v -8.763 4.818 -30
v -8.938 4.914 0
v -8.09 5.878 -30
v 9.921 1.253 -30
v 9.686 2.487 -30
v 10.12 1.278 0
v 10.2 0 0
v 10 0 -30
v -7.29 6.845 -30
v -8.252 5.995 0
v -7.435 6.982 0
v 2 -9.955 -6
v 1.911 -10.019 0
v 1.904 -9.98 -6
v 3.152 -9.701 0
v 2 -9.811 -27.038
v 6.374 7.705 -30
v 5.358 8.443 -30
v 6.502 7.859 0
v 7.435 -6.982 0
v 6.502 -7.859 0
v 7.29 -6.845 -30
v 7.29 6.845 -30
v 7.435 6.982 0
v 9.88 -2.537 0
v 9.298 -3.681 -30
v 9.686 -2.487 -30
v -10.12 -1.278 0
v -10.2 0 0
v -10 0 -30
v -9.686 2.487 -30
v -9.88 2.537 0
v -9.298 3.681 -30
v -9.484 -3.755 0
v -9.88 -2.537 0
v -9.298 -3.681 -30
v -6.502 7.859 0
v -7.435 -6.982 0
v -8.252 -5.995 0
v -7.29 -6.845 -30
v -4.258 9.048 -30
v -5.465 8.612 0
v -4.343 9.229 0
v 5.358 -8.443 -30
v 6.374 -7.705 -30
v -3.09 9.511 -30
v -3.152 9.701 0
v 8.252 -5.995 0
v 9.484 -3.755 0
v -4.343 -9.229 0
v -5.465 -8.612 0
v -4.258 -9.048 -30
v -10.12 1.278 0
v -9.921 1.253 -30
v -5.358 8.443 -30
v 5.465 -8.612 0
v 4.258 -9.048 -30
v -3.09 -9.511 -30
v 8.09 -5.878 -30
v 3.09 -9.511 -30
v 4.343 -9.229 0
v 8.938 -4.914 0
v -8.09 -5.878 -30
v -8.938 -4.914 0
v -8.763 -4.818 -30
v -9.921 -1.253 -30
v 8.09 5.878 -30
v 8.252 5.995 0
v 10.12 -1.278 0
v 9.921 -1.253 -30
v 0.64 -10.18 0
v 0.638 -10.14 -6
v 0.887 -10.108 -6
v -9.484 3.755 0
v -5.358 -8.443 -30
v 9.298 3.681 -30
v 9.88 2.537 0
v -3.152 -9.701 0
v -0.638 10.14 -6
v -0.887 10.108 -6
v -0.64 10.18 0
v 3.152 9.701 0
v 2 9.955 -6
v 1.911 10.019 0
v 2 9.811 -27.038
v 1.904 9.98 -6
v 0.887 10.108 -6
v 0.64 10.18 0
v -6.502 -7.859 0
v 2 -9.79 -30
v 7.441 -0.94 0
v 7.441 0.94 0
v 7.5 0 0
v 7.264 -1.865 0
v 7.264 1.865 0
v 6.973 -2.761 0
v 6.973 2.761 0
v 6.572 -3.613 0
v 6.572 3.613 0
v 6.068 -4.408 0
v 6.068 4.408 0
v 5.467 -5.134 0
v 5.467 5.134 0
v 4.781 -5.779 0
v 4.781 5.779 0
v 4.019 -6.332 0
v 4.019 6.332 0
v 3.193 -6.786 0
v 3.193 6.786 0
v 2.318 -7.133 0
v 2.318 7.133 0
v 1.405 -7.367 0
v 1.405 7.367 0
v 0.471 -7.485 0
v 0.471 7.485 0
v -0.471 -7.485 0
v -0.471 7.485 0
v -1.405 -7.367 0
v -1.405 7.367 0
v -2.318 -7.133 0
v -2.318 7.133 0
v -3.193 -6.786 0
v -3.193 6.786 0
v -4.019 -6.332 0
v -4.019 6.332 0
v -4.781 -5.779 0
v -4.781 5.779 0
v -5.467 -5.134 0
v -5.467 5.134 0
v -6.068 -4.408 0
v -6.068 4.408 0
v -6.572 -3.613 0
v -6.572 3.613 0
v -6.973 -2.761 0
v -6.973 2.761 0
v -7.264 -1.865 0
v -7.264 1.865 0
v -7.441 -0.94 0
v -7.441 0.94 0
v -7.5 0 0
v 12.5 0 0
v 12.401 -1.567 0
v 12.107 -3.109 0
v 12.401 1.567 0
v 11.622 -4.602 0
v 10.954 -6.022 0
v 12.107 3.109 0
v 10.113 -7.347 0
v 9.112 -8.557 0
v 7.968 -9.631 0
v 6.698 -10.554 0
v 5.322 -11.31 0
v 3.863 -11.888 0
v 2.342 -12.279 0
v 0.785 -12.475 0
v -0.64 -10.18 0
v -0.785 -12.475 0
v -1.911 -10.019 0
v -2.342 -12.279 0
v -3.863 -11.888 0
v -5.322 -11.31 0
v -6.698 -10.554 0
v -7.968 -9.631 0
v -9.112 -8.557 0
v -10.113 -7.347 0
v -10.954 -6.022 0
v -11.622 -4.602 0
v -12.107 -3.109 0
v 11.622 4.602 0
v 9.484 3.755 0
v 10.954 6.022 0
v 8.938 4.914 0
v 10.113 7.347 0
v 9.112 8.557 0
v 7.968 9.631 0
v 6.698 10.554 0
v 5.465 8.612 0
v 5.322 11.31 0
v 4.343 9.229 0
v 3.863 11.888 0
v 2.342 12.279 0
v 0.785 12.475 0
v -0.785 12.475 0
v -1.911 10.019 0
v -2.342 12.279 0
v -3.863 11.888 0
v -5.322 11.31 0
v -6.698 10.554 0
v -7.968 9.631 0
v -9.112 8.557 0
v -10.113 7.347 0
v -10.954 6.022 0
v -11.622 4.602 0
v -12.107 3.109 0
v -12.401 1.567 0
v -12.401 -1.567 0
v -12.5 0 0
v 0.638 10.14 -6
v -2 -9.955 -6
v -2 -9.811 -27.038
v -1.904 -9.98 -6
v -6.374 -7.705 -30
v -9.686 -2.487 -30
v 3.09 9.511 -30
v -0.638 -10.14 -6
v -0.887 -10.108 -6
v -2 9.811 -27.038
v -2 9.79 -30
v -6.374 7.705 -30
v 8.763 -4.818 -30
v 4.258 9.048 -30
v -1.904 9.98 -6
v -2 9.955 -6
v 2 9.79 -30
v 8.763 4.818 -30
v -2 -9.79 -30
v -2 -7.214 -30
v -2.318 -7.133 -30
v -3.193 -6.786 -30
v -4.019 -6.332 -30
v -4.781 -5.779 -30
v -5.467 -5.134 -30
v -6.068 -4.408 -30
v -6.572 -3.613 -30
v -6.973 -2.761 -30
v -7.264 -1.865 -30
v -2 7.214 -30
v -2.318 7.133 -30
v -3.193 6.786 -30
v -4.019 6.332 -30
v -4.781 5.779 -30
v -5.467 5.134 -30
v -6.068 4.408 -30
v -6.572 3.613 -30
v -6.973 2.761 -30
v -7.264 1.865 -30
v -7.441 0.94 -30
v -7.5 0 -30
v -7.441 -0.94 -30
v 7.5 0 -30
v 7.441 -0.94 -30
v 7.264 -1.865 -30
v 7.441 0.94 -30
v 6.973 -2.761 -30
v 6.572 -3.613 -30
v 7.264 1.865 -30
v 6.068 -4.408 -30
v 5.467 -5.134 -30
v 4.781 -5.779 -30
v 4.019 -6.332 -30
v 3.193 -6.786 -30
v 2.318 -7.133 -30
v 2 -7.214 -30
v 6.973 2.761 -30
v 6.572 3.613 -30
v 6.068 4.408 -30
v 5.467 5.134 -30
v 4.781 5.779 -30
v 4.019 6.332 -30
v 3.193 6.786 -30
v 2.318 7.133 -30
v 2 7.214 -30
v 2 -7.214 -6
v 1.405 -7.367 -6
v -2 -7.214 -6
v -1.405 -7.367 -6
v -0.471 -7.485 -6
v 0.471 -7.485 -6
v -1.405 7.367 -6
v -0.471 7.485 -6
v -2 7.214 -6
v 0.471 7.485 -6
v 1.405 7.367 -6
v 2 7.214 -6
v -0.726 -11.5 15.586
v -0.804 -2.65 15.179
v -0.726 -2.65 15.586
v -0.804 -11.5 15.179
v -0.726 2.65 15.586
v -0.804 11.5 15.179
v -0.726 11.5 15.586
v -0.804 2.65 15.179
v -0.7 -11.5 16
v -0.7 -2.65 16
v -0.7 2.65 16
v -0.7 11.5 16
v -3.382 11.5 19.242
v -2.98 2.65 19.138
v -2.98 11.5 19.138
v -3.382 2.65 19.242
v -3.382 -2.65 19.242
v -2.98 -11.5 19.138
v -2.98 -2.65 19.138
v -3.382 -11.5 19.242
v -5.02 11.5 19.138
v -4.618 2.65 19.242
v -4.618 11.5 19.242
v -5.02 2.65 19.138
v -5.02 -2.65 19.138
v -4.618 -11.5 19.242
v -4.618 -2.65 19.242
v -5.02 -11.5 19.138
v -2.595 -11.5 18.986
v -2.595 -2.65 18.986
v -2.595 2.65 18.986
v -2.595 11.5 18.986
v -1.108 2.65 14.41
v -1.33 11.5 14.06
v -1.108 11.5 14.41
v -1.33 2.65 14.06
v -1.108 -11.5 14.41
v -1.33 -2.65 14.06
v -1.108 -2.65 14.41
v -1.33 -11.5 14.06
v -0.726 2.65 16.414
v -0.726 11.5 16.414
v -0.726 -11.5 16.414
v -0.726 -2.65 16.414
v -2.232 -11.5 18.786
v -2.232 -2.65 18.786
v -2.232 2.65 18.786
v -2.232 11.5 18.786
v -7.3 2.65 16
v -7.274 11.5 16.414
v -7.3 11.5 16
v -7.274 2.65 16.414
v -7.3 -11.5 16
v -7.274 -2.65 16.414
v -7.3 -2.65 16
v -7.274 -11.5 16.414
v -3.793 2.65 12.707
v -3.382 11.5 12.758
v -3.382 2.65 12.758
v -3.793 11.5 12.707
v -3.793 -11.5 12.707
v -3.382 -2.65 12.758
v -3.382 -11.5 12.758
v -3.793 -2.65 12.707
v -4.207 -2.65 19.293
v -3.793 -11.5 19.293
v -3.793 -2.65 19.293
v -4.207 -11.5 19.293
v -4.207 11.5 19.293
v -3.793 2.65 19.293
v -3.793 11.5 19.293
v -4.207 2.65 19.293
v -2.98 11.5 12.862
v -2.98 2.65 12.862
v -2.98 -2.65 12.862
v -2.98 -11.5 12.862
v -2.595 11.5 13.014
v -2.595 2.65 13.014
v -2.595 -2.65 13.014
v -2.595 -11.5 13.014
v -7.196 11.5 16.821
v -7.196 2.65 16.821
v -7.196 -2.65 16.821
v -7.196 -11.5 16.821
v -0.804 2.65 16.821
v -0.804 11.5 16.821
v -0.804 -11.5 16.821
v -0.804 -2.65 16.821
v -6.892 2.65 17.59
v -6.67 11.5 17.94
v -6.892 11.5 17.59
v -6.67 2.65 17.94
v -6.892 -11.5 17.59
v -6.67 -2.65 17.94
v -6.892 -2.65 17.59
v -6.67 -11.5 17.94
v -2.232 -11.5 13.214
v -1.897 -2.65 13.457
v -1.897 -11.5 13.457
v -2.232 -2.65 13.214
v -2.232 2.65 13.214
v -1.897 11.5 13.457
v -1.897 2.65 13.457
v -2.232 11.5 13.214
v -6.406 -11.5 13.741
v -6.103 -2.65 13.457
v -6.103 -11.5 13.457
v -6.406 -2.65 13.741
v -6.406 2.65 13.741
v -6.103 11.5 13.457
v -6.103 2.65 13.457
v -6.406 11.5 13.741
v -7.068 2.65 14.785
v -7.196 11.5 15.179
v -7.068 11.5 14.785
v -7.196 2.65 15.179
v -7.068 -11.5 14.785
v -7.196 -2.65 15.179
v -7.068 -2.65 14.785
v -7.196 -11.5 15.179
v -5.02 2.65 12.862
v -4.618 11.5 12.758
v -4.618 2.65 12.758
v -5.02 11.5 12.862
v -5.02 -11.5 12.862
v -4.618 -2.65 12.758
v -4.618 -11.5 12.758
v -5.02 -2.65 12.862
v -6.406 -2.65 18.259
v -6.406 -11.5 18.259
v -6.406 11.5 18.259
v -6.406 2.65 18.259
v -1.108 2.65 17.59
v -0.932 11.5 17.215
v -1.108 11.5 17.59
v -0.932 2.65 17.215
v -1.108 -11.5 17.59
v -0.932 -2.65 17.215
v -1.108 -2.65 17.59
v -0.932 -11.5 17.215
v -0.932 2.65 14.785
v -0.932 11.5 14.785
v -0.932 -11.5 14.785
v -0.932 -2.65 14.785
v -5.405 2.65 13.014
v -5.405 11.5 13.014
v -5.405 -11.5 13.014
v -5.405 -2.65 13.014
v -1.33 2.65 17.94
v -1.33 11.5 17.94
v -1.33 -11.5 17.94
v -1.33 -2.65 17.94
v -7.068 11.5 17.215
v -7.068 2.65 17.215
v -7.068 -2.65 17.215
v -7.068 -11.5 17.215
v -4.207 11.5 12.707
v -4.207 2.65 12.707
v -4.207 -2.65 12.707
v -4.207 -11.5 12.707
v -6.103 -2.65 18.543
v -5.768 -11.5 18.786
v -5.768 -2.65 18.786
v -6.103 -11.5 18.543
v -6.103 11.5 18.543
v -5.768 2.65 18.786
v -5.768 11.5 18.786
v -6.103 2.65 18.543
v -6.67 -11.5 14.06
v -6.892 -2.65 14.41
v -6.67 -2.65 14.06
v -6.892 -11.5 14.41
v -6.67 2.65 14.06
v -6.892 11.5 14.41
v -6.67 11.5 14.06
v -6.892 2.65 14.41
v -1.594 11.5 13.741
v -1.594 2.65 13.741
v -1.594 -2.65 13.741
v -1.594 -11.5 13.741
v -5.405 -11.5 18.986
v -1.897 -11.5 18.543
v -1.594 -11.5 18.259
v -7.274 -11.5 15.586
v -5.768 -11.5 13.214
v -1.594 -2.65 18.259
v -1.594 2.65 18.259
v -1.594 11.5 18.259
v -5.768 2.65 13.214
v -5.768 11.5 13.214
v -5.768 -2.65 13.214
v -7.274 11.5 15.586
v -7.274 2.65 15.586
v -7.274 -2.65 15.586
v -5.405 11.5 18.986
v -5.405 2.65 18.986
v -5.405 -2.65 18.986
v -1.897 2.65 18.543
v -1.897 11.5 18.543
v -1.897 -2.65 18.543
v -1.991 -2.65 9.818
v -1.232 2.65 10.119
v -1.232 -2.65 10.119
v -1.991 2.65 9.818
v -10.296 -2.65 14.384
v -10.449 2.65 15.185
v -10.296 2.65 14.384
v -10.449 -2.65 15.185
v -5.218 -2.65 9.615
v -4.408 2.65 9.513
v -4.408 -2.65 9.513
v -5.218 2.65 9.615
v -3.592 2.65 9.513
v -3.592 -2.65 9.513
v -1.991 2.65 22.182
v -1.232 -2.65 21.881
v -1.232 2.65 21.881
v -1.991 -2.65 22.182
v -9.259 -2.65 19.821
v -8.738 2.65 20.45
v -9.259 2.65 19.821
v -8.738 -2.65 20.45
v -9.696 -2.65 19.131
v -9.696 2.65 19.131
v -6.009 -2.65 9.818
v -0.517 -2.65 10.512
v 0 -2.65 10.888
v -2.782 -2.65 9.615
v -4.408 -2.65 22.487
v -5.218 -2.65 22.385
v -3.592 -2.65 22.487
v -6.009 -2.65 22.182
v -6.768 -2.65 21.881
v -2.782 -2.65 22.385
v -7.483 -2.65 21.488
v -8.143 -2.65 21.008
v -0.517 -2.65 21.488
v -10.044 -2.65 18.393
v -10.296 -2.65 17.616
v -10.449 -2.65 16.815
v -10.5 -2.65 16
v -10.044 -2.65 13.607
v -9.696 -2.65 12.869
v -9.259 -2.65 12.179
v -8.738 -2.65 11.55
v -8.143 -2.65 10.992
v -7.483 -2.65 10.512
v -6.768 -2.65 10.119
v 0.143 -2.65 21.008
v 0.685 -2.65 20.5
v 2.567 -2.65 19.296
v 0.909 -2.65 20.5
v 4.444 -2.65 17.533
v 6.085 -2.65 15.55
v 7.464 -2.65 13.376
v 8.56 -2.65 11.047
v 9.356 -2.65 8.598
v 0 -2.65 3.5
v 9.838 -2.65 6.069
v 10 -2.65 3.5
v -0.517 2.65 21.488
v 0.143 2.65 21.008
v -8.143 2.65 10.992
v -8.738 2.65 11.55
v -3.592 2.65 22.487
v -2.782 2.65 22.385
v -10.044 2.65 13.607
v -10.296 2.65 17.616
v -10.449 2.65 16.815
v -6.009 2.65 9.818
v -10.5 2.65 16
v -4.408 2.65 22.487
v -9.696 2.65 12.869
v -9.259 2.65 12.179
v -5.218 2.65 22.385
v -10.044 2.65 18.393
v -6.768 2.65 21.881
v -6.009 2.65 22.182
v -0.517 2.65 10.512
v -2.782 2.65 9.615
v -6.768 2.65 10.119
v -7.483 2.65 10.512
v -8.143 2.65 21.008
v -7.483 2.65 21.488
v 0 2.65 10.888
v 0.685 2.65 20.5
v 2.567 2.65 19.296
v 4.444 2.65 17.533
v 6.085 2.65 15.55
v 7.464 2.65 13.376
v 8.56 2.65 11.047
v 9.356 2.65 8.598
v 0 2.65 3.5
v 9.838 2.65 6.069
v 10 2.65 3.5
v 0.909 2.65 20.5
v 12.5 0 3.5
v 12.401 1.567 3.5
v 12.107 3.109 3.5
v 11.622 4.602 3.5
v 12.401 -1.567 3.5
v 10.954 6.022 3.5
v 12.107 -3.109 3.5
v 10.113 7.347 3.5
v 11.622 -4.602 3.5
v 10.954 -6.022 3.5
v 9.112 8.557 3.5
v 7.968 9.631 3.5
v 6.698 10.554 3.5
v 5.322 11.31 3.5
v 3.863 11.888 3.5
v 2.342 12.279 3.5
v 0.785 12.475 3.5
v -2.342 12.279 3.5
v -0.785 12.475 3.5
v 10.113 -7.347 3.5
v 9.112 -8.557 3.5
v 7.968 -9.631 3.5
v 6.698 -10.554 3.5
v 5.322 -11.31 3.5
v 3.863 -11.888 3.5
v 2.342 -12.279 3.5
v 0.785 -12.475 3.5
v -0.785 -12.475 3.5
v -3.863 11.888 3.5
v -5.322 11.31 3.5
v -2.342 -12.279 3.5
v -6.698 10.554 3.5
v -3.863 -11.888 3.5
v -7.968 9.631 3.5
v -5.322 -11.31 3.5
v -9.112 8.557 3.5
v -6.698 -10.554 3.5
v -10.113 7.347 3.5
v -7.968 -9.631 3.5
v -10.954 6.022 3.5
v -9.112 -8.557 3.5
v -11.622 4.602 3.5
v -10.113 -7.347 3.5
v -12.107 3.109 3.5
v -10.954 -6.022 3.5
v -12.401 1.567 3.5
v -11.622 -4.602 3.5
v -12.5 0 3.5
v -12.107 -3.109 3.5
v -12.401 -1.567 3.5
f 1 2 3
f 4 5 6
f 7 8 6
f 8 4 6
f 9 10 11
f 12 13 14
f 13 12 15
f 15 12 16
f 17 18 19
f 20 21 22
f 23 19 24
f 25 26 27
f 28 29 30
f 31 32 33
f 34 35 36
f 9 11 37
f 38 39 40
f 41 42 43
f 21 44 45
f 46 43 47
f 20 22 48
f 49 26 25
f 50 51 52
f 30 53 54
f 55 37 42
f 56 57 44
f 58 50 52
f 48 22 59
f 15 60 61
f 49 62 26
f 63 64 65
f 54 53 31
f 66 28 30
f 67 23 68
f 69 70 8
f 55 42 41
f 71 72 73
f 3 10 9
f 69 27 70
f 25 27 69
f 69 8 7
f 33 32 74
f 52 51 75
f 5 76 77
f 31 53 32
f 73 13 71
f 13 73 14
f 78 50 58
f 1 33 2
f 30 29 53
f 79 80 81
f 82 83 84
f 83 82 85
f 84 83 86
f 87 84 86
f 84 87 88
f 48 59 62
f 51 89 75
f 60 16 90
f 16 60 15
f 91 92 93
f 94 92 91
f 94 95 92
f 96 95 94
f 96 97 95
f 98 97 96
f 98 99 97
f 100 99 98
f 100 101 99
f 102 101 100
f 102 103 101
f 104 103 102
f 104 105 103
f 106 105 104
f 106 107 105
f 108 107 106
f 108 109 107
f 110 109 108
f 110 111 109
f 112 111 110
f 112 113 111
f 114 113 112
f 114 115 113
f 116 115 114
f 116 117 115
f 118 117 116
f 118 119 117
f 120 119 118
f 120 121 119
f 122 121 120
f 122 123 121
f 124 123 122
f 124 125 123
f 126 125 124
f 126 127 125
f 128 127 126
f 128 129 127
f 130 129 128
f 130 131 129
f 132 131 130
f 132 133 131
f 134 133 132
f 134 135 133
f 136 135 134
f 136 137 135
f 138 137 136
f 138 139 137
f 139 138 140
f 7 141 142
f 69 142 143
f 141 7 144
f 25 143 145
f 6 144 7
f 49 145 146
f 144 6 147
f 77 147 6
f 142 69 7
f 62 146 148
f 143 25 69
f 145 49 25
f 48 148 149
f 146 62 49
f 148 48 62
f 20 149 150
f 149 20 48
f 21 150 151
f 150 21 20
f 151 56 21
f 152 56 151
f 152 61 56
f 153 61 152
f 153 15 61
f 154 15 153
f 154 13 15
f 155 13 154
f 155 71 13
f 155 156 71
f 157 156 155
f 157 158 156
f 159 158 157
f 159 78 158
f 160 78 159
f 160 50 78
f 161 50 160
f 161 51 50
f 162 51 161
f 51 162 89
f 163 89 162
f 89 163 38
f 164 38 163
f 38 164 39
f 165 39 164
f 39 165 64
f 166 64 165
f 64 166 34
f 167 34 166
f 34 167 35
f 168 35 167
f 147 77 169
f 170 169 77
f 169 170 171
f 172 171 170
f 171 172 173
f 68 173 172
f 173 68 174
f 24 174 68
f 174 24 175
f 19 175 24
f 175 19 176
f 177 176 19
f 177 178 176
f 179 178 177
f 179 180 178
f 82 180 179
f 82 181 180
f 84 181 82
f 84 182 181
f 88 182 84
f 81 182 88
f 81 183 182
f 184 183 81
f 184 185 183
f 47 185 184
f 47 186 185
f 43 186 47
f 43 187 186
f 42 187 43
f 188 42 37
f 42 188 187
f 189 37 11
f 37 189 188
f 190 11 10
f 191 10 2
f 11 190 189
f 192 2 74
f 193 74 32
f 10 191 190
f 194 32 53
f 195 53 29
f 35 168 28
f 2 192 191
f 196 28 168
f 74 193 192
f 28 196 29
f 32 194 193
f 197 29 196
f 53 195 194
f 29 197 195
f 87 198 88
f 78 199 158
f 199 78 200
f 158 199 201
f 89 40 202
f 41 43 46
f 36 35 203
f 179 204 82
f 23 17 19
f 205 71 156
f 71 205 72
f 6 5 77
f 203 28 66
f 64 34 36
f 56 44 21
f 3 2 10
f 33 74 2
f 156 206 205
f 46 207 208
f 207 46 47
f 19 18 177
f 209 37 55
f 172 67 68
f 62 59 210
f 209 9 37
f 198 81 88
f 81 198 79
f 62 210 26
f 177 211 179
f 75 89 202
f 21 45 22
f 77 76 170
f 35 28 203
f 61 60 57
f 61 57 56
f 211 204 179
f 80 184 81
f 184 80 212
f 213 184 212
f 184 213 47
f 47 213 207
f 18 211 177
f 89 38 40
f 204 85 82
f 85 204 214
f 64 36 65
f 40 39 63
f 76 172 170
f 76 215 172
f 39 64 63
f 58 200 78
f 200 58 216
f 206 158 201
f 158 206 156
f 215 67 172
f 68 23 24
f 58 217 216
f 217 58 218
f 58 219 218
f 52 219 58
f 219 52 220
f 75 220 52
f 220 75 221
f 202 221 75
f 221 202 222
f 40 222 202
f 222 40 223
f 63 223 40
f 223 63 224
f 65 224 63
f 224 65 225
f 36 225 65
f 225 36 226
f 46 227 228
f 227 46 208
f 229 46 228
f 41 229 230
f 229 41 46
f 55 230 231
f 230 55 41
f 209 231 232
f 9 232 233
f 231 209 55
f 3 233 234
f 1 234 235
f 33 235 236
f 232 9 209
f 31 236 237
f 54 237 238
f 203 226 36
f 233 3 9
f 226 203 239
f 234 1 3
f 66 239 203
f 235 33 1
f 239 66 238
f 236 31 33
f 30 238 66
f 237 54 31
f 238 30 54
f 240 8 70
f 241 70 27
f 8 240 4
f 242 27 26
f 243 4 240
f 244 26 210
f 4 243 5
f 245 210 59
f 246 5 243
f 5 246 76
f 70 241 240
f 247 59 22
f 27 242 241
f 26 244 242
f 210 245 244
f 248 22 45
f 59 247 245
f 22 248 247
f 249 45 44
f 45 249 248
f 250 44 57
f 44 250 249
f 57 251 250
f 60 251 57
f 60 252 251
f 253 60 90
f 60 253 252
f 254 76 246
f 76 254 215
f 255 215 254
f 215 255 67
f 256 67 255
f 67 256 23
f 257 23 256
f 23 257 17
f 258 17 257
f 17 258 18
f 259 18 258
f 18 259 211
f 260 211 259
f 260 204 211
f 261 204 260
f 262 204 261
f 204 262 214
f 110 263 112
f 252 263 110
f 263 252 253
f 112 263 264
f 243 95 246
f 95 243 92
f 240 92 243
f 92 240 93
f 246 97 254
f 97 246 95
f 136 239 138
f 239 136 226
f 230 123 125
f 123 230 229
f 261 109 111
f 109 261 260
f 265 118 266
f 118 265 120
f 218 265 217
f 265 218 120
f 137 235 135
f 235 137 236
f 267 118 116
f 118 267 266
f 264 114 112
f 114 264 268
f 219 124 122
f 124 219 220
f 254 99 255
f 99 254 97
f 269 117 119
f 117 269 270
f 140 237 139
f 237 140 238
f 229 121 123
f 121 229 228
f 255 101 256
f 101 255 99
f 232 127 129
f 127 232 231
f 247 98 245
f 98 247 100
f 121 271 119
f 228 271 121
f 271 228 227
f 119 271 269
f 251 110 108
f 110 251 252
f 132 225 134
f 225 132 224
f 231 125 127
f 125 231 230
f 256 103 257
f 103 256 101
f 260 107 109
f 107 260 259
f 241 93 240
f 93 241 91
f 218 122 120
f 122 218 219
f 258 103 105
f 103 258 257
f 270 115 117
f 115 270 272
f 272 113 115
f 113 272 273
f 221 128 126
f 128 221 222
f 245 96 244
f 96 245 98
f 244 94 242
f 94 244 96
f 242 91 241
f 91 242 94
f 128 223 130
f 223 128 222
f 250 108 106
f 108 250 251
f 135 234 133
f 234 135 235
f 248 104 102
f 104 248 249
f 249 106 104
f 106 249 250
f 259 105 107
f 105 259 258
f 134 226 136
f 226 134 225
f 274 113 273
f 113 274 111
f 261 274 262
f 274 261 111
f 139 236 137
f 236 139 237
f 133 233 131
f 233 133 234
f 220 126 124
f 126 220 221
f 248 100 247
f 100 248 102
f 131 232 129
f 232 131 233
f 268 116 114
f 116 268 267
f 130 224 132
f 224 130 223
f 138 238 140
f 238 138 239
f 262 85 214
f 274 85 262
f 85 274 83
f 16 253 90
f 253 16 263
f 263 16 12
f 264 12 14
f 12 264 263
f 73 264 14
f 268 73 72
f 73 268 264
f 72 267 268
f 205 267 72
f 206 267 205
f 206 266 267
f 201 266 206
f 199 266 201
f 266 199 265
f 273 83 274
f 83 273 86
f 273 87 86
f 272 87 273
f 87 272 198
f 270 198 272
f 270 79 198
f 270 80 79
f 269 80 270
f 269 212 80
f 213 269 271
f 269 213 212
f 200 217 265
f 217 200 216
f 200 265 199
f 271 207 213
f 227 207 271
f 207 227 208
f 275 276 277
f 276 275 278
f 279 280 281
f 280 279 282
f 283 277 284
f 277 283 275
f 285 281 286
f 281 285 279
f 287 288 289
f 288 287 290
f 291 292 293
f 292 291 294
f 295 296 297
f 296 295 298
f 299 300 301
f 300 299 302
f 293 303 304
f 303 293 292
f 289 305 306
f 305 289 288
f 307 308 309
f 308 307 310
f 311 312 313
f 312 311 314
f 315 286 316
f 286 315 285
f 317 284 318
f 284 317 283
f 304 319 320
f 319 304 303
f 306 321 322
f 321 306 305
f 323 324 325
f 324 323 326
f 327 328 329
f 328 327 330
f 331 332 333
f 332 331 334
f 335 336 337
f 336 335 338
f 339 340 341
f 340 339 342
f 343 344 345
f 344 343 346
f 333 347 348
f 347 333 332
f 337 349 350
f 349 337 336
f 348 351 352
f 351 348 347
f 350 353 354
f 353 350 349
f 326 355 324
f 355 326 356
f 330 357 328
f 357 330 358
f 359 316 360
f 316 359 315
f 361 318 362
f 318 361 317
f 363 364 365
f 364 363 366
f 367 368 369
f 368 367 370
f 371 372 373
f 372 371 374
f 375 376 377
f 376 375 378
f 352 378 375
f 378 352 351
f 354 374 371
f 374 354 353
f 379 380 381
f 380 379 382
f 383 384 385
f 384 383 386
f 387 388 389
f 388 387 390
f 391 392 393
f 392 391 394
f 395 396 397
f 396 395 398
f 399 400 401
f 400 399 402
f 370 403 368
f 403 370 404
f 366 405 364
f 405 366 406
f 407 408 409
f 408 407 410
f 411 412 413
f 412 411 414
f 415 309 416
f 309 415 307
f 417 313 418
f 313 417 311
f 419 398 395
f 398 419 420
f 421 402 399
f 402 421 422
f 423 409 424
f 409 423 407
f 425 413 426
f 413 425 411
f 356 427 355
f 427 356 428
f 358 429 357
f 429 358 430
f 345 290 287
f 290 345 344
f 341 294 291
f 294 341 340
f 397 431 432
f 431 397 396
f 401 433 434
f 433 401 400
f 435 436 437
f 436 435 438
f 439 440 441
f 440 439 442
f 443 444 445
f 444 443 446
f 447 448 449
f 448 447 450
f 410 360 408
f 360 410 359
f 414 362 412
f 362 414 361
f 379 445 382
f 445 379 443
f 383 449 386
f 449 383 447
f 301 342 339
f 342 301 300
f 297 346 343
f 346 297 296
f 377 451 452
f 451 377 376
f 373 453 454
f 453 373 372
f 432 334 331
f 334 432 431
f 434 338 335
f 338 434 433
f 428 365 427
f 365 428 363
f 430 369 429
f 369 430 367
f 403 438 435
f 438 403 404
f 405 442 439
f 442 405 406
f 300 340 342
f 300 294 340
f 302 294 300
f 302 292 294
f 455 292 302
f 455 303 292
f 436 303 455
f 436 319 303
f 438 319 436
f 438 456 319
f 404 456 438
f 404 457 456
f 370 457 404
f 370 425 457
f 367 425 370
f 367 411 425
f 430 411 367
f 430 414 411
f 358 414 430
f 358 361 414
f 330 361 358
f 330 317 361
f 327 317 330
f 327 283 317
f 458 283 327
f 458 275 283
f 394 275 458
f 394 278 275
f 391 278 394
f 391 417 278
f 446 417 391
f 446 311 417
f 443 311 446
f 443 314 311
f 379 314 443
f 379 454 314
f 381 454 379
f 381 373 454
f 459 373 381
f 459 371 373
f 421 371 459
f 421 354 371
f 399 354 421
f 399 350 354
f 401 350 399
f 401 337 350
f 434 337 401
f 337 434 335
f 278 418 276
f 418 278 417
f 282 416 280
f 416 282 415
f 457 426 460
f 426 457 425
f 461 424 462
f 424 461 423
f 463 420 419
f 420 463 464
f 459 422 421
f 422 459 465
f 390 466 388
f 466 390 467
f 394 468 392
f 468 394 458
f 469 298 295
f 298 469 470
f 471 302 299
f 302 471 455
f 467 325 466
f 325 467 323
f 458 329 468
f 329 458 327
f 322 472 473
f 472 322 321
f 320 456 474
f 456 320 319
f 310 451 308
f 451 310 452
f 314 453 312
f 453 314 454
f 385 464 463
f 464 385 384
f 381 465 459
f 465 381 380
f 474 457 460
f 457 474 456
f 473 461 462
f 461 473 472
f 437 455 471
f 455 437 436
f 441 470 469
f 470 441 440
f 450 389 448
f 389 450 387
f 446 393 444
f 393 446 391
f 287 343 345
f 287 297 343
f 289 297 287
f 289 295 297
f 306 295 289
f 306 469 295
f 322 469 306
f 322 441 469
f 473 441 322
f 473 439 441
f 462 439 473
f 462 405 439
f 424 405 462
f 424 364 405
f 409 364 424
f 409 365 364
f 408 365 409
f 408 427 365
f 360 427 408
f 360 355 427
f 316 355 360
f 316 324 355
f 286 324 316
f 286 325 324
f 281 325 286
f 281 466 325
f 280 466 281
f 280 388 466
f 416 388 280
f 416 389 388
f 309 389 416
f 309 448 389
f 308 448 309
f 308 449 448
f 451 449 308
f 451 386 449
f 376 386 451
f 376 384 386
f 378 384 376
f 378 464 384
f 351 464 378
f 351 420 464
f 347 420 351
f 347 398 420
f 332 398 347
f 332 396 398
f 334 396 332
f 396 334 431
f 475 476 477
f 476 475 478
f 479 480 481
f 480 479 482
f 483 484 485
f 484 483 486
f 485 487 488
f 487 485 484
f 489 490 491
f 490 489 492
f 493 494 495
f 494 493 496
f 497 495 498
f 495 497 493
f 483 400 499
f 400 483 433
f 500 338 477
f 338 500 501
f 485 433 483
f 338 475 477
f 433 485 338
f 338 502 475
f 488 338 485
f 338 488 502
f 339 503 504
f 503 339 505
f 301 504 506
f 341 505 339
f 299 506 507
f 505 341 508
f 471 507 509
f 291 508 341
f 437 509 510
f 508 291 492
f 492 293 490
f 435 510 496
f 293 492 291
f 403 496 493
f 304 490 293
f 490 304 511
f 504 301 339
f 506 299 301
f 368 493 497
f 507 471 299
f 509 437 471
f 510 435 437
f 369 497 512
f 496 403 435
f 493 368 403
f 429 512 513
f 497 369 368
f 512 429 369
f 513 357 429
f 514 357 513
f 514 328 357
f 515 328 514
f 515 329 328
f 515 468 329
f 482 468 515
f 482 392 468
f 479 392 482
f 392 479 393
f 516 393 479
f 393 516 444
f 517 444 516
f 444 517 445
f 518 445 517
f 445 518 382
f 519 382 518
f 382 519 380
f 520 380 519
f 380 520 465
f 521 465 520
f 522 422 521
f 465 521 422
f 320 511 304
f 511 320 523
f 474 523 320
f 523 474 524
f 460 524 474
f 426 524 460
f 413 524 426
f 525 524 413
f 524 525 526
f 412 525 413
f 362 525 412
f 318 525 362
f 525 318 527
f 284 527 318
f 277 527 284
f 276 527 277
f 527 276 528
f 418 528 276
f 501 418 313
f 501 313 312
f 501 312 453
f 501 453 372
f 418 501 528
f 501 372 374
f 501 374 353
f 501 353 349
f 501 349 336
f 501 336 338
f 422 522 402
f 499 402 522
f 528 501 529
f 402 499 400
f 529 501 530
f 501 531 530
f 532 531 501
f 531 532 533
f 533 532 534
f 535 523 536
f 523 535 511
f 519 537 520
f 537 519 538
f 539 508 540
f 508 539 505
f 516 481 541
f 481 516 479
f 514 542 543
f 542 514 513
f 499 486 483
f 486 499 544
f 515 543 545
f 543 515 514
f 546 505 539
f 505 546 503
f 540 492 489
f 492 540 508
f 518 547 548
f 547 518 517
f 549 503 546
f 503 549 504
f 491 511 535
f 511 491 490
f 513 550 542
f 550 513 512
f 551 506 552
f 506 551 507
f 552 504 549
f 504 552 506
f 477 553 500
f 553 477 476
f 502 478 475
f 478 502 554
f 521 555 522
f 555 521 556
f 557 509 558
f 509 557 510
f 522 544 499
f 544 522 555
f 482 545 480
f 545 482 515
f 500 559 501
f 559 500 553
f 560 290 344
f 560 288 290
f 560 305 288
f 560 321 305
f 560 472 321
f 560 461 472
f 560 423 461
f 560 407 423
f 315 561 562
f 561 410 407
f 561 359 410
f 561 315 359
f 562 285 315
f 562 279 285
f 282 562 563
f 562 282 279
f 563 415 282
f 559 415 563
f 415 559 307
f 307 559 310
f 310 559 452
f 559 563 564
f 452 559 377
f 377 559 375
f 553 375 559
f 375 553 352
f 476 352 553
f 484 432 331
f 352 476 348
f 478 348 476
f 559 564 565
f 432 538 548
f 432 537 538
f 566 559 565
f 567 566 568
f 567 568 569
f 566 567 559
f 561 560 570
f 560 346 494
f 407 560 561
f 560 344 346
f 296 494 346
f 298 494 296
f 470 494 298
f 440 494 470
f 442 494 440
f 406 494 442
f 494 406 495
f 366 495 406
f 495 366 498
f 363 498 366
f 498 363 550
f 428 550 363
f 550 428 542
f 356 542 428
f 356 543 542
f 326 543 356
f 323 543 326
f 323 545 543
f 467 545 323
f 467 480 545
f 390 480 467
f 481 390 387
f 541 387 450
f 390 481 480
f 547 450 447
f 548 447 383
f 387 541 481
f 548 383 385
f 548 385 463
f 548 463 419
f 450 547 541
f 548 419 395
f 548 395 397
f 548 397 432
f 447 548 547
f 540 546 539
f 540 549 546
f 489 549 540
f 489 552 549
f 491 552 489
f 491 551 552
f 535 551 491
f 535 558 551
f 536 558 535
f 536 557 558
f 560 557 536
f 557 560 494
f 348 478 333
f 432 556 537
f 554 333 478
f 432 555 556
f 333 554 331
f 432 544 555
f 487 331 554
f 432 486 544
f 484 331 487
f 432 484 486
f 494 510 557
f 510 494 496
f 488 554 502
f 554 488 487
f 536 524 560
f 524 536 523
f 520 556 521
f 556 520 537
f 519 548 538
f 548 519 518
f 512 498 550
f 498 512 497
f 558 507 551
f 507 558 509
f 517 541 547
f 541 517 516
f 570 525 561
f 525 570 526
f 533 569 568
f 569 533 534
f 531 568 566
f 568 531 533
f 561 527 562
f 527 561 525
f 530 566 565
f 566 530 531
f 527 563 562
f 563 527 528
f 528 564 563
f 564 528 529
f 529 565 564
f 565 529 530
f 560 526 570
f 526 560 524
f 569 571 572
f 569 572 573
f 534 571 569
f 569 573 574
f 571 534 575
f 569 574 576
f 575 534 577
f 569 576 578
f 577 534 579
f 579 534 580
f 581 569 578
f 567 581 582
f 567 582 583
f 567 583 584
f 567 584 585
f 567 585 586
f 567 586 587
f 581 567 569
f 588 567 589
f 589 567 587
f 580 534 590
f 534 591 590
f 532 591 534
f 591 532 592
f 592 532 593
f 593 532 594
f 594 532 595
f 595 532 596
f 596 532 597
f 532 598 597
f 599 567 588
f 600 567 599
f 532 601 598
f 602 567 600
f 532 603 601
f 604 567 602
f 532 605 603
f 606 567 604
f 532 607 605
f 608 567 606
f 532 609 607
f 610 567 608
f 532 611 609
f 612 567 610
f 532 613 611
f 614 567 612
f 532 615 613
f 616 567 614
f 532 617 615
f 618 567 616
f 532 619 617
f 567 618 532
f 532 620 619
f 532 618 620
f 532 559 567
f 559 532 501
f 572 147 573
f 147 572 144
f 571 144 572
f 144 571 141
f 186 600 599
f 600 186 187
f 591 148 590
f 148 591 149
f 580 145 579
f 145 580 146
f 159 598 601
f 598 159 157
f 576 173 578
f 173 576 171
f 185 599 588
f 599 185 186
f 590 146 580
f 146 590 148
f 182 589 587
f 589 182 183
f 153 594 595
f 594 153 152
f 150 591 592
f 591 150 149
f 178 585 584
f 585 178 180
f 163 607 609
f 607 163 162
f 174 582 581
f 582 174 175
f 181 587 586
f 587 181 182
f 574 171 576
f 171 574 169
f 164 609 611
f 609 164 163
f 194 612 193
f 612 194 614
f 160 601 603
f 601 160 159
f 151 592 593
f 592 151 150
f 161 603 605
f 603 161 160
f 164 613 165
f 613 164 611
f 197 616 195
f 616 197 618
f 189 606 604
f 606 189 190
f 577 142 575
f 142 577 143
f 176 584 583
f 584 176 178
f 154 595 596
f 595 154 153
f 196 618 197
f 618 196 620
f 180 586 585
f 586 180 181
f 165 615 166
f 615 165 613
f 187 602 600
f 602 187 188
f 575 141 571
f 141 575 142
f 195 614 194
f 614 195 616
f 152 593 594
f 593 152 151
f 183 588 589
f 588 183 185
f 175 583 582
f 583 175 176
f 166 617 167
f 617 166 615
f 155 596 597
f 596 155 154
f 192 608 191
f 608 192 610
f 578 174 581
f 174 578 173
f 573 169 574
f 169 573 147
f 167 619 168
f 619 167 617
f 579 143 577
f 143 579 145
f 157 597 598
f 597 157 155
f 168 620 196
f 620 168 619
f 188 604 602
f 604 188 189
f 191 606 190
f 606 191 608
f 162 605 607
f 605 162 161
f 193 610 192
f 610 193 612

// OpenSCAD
$fn=50;

// Base plate
cylinder(r=25/2, h= 3.5);

// Inserted part
translate([0,0,-30])
union() {
    difference() {
        cylinder(r2=10.2, r1=10, h=30);
        
        cylinder(r=7.5,h=50);
        
        translate([-2,-50,-6])
        cube([4,100,30]);
    }
}

// Top part
translate([0,0,3.5])
union() {
    translate([-4,0,12.5])
    rotate([-90,0,0])
    union() {
        translate([0,0,-23/2])
        cylinder(r=6.6/2, h=23);
        
        translate([0,0,-5.3/2])
        cylinder(r=13/2, h=5.3);        
    }
    
    intersection() {
        rad = 20.5;
        
        translate([-rad+10,0,0])
        rotate([-90,0,0])
        translate([0,0,-5.3/2])
        cylinder(r=rad,h=5.3);
        
        translate([0,-5.3/2,0])
        cube([10, 5.3, 17]);
    }
}
